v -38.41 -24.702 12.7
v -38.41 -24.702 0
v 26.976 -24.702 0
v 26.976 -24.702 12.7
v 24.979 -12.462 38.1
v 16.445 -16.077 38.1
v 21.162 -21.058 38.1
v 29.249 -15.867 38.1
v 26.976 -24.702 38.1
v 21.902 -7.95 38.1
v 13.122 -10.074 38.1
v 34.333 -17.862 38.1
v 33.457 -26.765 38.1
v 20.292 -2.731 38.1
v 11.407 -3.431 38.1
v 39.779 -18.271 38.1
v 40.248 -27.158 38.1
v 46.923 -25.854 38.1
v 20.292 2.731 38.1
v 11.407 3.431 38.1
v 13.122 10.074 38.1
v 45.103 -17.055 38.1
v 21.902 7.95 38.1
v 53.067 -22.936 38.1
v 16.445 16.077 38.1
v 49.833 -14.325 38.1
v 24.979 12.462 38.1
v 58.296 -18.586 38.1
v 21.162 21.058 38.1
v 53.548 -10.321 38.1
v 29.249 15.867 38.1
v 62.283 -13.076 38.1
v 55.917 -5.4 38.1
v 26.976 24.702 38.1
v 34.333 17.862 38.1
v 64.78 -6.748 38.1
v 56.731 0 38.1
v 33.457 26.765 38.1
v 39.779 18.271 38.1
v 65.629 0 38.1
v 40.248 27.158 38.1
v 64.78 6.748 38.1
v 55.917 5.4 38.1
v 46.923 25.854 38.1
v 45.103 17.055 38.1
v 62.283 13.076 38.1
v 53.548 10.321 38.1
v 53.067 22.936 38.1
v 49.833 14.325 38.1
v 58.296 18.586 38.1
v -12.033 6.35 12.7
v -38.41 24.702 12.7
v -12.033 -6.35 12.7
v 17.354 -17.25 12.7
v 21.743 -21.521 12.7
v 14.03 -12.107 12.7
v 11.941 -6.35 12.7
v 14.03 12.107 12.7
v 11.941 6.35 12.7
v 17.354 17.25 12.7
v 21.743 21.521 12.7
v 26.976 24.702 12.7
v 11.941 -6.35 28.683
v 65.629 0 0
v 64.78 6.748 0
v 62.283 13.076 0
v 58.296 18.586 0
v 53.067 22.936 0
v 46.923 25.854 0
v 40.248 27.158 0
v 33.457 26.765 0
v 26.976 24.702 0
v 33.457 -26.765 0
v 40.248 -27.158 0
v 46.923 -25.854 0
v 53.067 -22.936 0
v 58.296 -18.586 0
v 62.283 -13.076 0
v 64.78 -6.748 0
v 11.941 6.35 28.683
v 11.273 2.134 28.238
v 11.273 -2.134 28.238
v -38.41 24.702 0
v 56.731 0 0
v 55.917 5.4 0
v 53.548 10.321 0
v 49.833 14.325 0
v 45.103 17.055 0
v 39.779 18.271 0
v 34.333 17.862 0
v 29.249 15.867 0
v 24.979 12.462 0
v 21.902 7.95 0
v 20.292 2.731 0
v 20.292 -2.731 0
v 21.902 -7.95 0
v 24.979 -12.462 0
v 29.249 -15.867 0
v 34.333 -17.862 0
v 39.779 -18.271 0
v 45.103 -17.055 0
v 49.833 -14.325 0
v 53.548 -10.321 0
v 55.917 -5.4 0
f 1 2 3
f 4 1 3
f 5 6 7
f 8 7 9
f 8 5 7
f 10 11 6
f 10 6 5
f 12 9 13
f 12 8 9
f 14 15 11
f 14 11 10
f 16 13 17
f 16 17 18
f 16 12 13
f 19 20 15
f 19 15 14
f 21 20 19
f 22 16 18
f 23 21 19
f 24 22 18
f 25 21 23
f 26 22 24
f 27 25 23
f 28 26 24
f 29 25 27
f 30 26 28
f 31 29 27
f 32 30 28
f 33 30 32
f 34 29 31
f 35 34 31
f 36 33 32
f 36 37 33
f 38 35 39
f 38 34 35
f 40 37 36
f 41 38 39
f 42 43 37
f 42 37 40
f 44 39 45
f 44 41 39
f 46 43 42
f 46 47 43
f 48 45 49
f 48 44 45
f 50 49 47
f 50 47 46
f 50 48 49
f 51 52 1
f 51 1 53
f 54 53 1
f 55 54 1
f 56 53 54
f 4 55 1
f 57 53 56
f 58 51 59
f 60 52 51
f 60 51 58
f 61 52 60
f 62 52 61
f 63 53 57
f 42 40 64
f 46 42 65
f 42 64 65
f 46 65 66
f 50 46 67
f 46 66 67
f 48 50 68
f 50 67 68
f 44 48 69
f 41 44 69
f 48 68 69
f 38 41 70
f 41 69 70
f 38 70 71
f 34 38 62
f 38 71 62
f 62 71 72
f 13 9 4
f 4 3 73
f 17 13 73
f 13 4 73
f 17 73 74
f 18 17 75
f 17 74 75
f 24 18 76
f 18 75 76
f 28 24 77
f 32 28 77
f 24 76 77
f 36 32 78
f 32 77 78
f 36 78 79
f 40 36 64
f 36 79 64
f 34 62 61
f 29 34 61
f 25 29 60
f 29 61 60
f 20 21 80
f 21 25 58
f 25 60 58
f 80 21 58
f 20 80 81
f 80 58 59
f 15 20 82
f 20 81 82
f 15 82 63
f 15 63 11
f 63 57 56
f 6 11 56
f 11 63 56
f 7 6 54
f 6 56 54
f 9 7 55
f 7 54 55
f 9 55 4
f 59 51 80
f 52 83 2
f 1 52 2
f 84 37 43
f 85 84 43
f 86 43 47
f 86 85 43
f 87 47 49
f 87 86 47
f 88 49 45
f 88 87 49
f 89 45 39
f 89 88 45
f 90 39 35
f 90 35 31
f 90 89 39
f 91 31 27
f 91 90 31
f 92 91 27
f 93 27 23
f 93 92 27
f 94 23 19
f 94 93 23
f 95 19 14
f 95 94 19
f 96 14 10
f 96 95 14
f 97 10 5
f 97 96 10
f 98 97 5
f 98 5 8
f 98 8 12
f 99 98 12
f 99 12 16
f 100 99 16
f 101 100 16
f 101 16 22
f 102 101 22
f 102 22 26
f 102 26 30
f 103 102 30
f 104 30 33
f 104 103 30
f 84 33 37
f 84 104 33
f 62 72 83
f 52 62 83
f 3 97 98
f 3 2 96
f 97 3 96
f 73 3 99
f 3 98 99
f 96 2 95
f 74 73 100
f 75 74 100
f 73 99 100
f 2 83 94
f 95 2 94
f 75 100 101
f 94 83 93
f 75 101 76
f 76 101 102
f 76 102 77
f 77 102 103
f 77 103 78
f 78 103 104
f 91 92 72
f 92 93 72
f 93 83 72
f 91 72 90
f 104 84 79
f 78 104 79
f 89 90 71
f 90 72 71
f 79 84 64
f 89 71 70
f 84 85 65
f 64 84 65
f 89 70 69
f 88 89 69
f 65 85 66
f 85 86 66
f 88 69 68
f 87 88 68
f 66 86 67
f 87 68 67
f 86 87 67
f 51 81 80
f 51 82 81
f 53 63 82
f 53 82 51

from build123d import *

# Parameters (mm, degrees)
F0_R     = 18.321779
F1_DEPTH = 38.1
F2_DEPTH = 12.7
F4_DEPTH = 6.35


with BuildPart() as f1:
    # F0 (on Top) → F1 (new body)
    with BuildSketch(Plane.XY):
        with BuildLine():
            ThreePointArc((65.62934, 0), (53.067244, 22.936208), (26.97591, 24.702042))
            ThreePointArc((26.97591, 24.702042), (11.189707, 0), (26.97591, -24.702042))
            ThreePointArc((26.97591, -24.702042), (53.067244, -22.936208), (65.62934, 0))
        make_face()
        with Locations((38.409524, 0)):
            Circle(F0_R, mode=Mode.SUBTRACT)
    extrude(amount=F1_DEPTH)

    # F0 (on Top) → F2 (join)
    with BuildSketch(Plane.XY):
        with BuildLine():
            ThreePointArc((26.97591, -24.702042), (11.189707, 0), (26.97591, 24.702042))
            Line((26.97591, 24.702042), (-38.409524, 24.702042))
            Line((-38.409524, 24.702042), (-38.409524, -24.702042))
            Line((-38.409524, -24.702042), (26.97591, -24.702042))
        make_face()
    extrude(amount=F2_DEPTH)

    # F3 (on Front) → F4 (join, symmetric)
    with BuildSketch(Plane.XZ):
        Polygon((14.299882, 9.182032), (14.299882, 30.255545), (-17.310385, 9.182032), align=None)
    extrude(amount=F4_DEPTH, both=True)


solid = f1.part
